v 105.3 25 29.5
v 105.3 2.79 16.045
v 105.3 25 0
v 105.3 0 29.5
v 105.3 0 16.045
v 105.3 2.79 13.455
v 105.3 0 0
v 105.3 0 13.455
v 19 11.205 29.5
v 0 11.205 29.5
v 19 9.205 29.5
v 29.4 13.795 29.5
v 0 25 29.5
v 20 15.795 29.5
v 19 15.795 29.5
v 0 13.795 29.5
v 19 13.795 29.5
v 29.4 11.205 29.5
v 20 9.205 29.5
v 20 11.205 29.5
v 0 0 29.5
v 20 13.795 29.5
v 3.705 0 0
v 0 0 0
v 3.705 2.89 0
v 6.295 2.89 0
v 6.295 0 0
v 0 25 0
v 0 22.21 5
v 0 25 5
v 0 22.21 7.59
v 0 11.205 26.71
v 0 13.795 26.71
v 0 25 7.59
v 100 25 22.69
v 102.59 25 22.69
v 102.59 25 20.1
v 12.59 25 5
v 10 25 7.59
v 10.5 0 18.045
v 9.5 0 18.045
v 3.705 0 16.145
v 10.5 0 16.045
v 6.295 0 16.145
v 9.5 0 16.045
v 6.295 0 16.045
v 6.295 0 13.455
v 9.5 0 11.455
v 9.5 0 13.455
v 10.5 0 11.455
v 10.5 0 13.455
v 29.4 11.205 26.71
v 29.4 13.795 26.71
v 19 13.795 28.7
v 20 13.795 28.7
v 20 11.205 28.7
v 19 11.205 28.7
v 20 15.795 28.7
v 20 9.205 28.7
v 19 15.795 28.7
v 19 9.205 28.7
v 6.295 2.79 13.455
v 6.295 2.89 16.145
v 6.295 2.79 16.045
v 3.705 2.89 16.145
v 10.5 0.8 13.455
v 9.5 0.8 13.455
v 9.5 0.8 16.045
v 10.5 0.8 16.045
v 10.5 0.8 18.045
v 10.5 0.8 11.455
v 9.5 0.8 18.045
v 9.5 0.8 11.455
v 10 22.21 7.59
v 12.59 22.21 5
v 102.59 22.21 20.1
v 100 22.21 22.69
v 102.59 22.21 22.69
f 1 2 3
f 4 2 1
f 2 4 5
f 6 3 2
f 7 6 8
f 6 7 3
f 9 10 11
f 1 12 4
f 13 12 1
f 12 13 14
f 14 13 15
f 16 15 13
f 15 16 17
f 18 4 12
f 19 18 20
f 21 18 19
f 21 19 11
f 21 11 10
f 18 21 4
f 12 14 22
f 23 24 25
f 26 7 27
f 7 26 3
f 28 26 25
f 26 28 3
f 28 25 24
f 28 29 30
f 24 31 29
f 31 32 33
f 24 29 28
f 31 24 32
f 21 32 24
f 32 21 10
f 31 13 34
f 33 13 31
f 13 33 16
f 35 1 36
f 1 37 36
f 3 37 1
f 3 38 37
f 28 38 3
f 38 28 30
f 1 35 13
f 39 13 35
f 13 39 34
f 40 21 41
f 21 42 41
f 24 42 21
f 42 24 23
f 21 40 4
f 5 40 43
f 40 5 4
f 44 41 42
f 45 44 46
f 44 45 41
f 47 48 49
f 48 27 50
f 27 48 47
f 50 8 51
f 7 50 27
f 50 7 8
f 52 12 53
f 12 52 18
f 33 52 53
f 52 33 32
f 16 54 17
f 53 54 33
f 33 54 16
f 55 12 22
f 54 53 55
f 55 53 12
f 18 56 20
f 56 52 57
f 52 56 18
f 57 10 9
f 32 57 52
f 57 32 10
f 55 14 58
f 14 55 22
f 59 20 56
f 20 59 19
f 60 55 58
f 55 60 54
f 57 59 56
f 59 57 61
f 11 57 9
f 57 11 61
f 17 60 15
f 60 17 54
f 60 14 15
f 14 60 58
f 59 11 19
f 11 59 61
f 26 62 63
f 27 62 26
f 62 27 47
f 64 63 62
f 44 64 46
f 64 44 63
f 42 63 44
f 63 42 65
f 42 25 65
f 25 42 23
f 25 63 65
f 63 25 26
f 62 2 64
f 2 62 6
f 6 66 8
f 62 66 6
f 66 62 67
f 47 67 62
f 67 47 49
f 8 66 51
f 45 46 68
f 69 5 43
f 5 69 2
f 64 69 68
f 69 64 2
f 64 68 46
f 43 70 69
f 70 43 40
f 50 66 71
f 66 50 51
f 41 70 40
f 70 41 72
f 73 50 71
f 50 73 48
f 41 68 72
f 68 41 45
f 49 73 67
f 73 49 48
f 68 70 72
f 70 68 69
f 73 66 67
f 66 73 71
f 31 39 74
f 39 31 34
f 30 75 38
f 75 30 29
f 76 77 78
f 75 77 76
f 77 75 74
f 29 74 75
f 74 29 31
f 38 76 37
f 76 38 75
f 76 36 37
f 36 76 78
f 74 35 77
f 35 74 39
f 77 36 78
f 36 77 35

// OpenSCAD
// Float Arm Wire Bending Tool
// For IE-F385B fuel sender float arm
// Wire: 0.090" (~2.29mm) stainless steel
// Single block with channels on different faces, bends at edges

// ========== Parameters ==========

// Wire specifications
wire_diameter = 2.29;  // 0.090 inches in mm
channel_clearance = 0.3;  // Extra clearance for wire
channel_width = wire_diameter + channel_clearance;
channel_depth = wire_diameter + 0.5;  // Deep enough to hold wire

// Bend dimensions from drawing
bend1_length = 19.5;     // Total length of tip section (first bend)
bend2_length = 95.3;     // Distance from first to second bend
bend3_length = 90.0;     // Length of diagonal section
bend3_offset = 15.1;     // Offset over the diagonal section
bend3_angle = atan(bend3_offset / bend3_length);  // ~9.53 degrees

// Block dimensions - sized to accommodate both channels
block_length = bend2_length + 10;  // Long enough for 95.3mm channel + grip
block_width = 25;                   // Width for comfortable grip
block_height = bend1_length + 10;   // Tall enough for 19.5mm channel + grip

// Reference mark dimensions
mark_depth = 0.8;
mark_width = 1;

// ========== Modules ==========

// Wire channel - U-shaped groove
module wire_channel(length) {
    translate([0, -channel_width/2, 0])
        cube([length, channel_width, channel_depth + 0.1]);
}

// Reference mark across channel
module ref_mark() {
    translate([0, -channel_width - 2, 0])
        cube([mark_width, channel_width + 4, mark_depth]);
}

// ========== Main Tool ==========

module float_arm_bend_tool() {
    difference() {
        // Main block
        cube([block_length, block_width, block_height]);

        // === Station 1: 19.5mm tip bend ===
        // Channel on TOP face, runs to the LEFT edge (X=0)
        // Position wire with 19.5mm extending past the edge, bend over edge
        translate([-0.1, block_width/2, block_height - channel_depth])
            wire_channel(bend1_length + 10);

        // Reference mark at 19.5mm from left edge
        translate([bend1_length - mark_width/2, block_width/2 - channel_width/2 - 2,
                   block_height - mark_depth])
            cube([mark_width, channel_width + 4, mark_depth + 0.1]);

        // === Relief channel for Station 1 bent wire when using Station 2 ===
        // On FRONT face (Y=0), at start of Station 2 channel, running down (-Z)
        // Accepts the already-bent tip from Station 1 when making the Station 2 bend
        translate([block_length - bend2_length - 5 - channel_width/2, -0.1, -0.1])
            cube([channel_width, channel_depth + 0.2, block_height/2 + channel_width/2 + 0.2]);

        // === Station 2: 95.3mm second bend ===
        // Channel on FRONT face (Y=0), runs to the RIGHT edge (X=block_length)
        // Position wire with reference at left, 95.3mm to right edge for bending
        translate([block_length - bend2_length - 5, -0.1, block_height/2])
            rotate([-90, 0, 0])
                wire_channel(bend2_length + 5 + 0.1);

        // Reference mark at start of 95.3mm measurement
        translate([block_length - bend2_length - mark_width/2, -0.1,
                   block_height/2 - channel_width/2 - 2])
            cube([mark_width, mark_depth + 0.1, channel_width + 4]);

        // === Station 3: Diagonal bend (15.1mm offset over 90mm) ===
        // On BACK face (Y=block_width)

        // Straight reference channel from edge to bend start point
        // This gives a reference to bend against
        bend3_start = 10;  // Where the diagonal bend begins
        bend3_z = 5;       // Z height at bend start (bottom of channel)
        translate([-0.1, block_width - channel_depth, bend3_z])
            cube([bend3_start + channel_width, channel_depth + 0.2, channel_width]);

        // Diagonal channel using hull - starts where reference channel ends
        hull() {
            // Start of diagonal at bend point (aligned with reference channel)
            translate([bend3_start, block_width - channel_depth, bend3_z])
                cube([channel_width, channel_depth + 0.2, channel_width]);
            // End of diagonal (offset by 15.1mm in Z over 90mm)
            translate([bend3_start + bend3_length, block_width - channel_depth, bend3_z + bend3_offset])
                cube([channel_width, channel_depth + 0.2, channel_width]);
        }
    }
}

// ========== Render ==========

float_arm_bend_tool();
